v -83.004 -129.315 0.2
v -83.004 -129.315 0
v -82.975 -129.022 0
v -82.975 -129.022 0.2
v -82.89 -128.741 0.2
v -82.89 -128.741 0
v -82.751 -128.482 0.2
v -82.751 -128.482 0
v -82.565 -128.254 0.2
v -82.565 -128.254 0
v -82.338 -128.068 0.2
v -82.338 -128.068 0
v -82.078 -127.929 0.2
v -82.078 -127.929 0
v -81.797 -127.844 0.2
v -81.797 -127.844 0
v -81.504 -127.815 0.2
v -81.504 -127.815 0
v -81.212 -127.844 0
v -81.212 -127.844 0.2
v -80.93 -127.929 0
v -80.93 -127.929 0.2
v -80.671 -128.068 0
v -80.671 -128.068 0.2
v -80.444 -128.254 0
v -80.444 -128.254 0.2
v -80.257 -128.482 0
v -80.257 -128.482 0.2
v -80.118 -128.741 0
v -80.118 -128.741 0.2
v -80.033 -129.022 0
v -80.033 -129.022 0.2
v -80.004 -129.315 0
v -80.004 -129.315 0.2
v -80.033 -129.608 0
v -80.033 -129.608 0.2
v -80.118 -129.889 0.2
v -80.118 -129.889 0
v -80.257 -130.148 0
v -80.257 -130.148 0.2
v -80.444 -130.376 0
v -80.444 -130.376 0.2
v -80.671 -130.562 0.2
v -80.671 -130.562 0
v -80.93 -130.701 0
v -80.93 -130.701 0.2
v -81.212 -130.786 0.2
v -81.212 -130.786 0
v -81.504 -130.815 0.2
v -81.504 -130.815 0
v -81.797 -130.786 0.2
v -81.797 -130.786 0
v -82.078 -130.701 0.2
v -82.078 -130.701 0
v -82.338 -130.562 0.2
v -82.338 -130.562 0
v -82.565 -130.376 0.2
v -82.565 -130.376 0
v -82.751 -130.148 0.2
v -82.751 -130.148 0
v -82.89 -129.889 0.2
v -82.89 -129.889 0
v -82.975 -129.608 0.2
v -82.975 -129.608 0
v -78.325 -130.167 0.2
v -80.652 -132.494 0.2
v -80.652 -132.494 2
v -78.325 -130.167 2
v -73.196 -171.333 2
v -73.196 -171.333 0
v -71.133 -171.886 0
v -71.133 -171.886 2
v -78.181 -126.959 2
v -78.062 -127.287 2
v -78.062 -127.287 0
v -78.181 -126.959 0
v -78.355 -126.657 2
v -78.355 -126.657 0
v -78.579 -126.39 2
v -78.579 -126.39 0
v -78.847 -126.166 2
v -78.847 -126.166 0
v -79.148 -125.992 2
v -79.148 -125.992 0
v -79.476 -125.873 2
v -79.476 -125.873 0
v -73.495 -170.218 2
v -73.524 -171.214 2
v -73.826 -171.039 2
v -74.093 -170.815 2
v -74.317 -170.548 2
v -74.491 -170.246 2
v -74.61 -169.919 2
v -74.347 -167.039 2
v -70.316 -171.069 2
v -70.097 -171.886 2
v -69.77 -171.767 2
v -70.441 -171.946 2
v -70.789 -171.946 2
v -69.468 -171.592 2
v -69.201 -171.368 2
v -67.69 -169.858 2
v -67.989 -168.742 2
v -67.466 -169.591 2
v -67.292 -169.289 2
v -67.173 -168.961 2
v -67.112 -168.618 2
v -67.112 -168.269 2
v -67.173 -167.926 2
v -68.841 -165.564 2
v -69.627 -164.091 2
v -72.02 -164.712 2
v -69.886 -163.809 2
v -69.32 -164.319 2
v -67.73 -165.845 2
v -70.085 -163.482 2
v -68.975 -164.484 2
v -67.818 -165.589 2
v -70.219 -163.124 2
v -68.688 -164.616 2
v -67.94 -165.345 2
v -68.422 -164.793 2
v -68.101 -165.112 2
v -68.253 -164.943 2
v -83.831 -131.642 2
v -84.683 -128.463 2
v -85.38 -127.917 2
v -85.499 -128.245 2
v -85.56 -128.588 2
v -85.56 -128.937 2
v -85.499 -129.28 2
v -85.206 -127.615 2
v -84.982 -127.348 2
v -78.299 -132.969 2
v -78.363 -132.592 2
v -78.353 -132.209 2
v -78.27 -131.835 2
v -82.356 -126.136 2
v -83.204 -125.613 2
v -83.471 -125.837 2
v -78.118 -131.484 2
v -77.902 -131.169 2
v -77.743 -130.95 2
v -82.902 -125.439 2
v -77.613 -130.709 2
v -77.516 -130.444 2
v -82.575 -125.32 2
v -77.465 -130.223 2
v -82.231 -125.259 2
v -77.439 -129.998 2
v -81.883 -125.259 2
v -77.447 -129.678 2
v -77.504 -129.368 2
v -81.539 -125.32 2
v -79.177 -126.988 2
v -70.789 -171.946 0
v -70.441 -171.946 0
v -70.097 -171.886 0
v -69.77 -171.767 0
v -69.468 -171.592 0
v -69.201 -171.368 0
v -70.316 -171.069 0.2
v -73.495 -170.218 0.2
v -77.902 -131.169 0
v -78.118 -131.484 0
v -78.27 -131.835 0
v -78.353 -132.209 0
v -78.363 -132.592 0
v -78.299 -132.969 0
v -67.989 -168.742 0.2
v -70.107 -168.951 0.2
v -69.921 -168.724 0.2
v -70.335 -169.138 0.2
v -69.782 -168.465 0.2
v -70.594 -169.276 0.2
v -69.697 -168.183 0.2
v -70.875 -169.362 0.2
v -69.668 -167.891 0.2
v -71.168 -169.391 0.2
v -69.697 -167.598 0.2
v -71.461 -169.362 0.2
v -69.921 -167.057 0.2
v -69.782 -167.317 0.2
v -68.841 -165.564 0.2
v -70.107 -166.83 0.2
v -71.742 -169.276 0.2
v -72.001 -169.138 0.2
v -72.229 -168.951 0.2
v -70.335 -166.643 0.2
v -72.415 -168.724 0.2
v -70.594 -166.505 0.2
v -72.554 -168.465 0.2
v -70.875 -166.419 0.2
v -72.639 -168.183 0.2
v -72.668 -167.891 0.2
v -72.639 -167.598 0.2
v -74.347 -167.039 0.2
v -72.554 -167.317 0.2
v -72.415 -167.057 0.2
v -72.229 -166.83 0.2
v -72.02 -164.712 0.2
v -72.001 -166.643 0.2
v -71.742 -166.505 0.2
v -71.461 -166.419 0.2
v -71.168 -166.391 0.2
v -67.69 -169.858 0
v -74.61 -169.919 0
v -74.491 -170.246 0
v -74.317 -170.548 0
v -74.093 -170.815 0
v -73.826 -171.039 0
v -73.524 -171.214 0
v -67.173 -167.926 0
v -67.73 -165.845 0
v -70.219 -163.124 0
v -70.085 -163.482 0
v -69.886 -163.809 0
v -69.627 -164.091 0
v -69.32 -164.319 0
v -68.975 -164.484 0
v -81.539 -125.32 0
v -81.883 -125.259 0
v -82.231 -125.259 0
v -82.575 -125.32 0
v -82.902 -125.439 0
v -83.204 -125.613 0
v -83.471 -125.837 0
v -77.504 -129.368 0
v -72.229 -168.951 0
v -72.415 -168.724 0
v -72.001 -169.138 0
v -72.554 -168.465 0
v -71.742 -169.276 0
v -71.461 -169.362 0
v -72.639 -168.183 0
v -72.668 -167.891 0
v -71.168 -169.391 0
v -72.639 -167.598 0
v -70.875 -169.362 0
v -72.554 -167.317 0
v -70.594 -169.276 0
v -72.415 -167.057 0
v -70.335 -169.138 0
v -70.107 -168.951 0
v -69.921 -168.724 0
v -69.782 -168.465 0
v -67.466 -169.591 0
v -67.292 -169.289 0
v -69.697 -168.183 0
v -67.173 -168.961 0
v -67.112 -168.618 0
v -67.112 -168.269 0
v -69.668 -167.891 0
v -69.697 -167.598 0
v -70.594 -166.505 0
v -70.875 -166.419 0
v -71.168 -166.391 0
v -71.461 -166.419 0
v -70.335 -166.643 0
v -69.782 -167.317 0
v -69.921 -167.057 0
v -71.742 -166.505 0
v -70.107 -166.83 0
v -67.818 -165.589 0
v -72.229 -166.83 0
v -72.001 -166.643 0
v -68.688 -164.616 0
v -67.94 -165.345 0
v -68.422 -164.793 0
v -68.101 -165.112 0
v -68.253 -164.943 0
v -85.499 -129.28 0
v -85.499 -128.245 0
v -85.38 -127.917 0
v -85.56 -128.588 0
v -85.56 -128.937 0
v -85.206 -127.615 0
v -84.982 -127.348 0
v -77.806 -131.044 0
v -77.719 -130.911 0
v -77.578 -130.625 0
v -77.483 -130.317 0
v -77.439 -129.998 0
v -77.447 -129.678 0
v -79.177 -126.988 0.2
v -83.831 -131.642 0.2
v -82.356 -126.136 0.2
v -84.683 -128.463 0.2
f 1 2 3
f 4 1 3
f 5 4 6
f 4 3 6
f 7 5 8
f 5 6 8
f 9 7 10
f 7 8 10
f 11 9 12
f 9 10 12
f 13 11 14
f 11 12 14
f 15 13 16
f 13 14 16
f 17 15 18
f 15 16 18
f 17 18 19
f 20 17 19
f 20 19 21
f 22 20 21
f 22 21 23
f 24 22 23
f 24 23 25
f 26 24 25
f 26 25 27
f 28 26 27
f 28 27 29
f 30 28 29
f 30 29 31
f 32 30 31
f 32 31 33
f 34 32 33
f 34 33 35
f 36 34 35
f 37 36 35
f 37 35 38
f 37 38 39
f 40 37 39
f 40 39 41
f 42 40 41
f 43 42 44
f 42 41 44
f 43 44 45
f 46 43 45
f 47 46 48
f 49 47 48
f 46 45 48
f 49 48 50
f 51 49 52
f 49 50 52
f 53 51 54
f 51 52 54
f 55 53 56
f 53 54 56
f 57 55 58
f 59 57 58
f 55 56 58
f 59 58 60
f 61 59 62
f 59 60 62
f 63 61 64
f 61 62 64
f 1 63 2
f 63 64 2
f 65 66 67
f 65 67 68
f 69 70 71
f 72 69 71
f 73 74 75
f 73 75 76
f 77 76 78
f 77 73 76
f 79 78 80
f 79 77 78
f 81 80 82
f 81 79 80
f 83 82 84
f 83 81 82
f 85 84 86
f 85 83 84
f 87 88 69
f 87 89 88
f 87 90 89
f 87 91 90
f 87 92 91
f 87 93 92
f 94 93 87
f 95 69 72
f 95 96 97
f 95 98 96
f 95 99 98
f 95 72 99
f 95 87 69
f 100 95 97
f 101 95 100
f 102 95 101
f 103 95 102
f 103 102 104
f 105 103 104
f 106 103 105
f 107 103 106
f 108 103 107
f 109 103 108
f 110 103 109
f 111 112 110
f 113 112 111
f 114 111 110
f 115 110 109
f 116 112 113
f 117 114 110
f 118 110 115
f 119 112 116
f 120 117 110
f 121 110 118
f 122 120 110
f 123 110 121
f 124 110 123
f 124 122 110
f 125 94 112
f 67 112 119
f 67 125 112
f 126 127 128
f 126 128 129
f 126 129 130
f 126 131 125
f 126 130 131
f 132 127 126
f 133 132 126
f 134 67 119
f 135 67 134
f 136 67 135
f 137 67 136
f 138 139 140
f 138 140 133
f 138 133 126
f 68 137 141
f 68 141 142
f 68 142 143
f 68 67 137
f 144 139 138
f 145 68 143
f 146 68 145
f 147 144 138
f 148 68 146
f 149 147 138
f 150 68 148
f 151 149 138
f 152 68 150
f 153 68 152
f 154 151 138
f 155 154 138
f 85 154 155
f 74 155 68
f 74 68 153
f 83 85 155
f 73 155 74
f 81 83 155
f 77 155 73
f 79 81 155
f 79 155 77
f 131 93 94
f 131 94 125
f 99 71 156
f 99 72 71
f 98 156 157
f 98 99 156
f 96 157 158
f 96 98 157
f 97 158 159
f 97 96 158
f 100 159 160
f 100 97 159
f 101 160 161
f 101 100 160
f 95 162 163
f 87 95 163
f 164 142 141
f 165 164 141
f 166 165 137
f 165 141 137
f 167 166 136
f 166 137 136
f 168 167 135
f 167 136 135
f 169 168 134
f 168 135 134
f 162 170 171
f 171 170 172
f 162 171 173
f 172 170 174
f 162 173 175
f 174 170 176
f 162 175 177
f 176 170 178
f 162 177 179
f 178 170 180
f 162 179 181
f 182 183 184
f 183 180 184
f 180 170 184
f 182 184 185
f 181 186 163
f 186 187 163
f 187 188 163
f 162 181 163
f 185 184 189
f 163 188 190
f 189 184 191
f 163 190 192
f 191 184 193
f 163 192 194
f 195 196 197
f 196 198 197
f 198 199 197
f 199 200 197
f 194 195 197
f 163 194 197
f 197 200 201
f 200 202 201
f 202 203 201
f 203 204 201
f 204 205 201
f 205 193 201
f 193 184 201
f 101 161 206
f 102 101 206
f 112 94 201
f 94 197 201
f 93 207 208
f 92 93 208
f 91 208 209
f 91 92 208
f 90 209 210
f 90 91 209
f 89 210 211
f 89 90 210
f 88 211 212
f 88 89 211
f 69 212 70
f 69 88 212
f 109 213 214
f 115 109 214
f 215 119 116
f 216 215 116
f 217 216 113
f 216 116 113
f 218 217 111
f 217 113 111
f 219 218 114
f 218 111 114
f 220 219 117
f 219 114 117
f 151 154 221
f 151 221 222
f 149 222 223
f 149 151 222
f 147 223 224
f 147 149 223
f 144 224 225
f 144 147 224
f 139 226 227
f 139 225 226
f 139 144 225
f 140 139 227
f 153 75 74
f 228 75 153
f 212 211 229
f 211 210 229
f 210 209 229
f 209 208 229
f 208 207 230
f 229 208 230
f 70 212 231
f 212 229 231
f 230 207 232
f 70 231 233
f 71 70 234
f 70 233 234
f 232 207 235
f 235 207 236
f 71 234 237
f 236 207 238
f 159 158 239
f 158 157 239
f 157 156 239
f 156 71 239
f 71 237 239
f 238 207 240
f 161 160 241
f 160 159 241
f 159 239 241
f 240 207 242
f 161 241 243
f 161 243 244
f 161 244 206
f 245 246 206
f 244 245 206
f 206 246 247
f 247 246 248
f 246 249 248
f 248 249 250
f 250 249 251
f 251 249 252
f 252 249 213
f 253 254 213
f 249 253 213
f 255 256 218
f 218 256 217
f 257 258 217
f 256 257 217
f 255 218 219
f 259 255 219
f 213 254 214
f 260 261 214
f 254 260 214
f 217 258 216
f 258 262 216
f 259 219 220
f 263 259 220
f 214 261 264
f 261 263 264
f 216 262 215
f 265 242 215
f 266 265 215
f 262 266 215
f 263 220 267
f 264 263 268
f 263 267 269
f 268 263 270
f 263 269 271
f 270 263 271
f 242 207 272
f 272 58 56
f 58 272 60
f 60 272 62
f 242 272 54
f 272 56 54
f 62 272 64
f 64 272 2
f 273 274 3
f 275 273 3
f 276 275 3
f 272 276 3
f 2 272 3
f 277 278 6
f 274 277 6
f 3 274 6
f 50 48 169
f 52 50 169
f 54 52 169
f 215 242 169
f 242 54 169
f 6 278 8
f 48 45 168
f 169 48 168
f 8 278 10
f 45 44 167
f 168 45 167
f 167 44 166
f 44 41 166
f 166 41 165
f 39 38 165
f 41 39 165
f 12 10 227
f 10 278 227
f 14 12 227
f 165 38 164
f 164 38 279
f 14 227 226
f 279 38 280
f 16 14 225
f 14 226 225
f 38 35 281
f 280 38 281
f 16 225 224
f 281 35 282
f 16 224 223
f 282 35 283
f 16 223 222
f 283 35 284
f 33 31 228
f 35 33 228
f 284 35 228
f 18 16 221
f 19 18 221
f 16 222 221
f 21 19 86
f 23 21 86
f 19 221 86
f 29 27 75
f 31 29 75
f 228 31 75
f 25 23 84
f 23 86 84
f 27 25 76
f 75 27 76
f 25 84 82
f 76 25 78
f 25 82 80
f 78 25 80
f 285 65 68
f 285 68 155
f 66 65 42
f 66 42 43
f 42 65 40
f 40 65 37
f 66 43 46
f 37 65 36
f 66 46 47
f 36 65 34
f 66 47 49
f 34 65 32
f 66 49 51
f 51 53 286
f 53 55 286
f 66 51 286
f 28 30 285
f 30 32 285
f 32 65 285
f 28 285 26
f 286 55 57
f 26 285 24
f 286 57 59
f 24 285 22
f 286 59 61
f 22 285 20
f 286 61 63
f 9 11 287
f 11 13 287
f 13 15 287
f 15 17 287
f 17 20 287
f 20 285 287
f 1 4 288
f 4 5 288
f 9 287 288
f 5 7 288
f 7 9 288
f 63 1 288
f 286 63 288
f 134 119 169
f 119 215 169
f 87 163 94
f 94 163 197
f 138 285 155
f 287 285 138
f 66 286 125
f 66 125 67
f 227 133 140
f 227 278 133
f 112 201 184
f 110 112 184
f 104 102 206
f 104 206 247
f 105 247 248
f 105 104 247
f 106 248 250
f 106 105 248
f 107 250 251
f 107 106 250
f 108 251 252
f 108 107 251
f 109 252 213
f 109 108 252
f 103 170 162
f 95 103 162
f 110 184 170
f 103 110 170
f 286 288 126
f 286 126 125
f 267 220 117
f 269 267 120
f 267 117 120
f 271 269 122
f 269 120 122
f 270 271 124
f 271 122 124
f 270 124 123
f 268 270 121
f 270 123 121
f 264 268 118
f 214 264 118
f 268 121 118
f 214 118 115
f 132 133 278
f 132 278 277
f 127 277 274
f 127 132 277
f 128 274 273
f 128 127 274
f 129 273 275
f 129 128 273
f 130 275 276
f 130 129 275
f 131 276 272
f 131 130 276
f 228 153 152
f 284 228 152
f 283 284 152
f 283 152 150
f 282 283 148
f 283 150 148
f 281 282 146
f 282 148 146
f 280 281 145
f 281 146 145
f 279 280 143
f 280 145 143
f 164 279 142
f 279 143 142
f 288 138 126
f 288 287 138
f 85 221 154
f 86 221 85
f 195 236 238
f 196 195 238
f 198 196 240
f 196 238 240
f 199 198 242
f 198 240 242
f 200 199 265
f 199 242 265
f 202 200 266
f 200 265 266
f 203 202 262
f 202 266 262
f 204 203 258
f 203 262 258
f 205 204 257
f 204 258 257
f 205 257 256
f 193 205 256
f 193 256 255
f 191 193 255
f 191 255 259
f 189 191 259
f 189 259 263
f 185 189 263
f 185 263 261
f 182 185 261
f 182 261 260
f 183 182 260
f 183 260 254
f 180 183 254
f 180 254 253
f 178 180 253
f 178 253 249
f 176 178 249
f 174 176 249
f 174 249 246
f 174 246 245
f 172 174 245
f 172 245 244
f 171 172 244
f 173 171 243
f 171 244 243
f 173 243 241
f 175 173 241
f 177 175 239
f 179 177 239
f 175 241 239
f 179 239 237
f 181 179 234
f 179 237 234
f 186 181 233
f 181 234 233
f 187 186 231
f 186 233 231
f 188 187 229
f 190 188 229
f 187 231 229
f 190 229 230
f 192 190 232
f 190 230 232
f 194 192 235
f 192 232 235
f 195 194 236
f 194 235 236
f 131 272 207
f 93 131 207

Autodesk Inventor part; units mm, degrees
ref_plane "YZ Plane" through (0, 0, 0) normal (1, 0, 0) x (0, 1, 0)
ref_plane "XZ Plane" through (0, 0, 0) normal (0, 1, 0) x (-1, 0, 0)
ref_plane "XY Plane" through (0, 0, 0) normal (0, 0, 1) x (1, 0, 0)
sketch "Эскиз1" plane through (0, 0, 0) normal (0, 0, 1) x (1, 0, 0)
  line L0 (-88.2272, -119.1) -> (-57.3625, -234.2883) projected
  line L1 (-71.2043, -171.0391) -> (-83.11, -126.6066) construction
  line L2 (-69.083, -167.3649) -> (-79.4357, -128.7279)
  line L3 (-85.2313, -130.2808) -> (-74.8785, -168.9178)
  arc A0 (-74.8785, -168.9178) -> (-69.083, -167.3649) centre (-71.9807, -168.1414) ccw
  arc A1 (-79.4357, -128.7279) -> (-85.2313, -130.2808) centre (-82.3335, -129.5043) ccw
  line L4 (-68.8409, -165.5636) -> (-67.9892, -168.7423)
  line L5 (-67.9892, -168.7423) -> (-70.3162, -171.0693)
  line L6 (-70.3162, -171.0693) -> (-73.495, -170.2176)
  line L7 (-73.495, -170.2176) -> (-74.3467, -167.0388)
  line L8 (-74.3467, -167.0388) -> (-72.0197, -164.7118)
  line L9 (-72.0197, -164.7118) -> (-68.8409, -165.5636)
  line L10 (-72.3186, -163.5965) -> (-75.4621, -166.74)
  line L11 (-75.4621, -166.74) -> (-74.3115, -171.0341)
  line L12 (-74.3115, -171.0341) -> (-70.0173, -172.1847)
  line L13 (-70.0173, -172.1847) -> (-66.8738, -169.0412)
  line L14 (-66.8738, -169.0412) -> (-68.0244, -164.7471)
  line L15 (-68.0244, -164.7471) -> (-72.3186, -163.5965)
  line L16 (-77.1571, -148.8229) -> (-74.2593, -148.0464)
  line L17 (-78.3254, -130.1669) -> (-79.1772, -126.9881)
  line L18 (-79.1772, -126.9881) -> (-82.356, -126.1364)
  line L19 (-82.356, -126.1364) -> (-84.683, -128.4634)
  line L20 (-84.683, -128.4634) -> (-83.8312, -131.6422)
  line L21 (-80.6525, -132.4939) -> (-78.3254, -130.1669)
  line L22 (-80.3536, -133.6093) -> (-84.6477, -132.4587)
  line L23 (-85.7983, -128.1645) -> (-82.6548, -125.021)
  line L24 (-82.6548, -125.021) -> (-78.3607, -126.1716)
  line L25 (-78.3607, -126.1716) -> (-77.2101, -130.4657)
  line L26 (-77.2101, -130.4657) -> (-80.3536, -133.6093)
  line L27 (-83.8312, -131.6422) -> (-80.6525, -132.4939)
  point P0 (0, 0)
  point P1 (-71.168, -167.8906)
  point P2 (-69.9205, -164.239)
  point P3 (-78.5981, -131.8538)
  dimension "d0" = 0
  dimension "d2" = 40
  dimension "d3" = 3
  dimension "d4" = 5.7
  dimension "d5" = 1
  dimension "d6" = 1
extrude "Выдавливание1" add sketch "Эскиз1" along normal blind 2 contours L23 L24 L25 L26 L2 L21 L17 L18 L19 A1 L0 | A1 L19 L20 L27 L21 L2 L26 L22 L0 | L22 L26 L2 L15 L10 L0 | L10 L15 L2 L9 L8 L7 L6 A0 L0 | A0 L6 L5 L4 L9 L2 L15 L14 L13 L12 L0
sketch "Эскиз2" plane through (0, 0, 0) normal (0, 0, -1) x (-1, 0, 0)
  line L0 (78.3254, -130.1669) -> (80.6525, -132.4939) projected
  line L1 (84.683, -128.4634) -> (82.356, -126.1364) projected
  line L2 (83.8312, -131.6422) -> (84.683, -128.4634) projected
  line L3 (80.6525, -132.4939) -> (83.8312, -131.6422) projected
  line L4 (82.356, -126.1364) -> (79.1772, -126.9881) projected
  line L5 (79.1772, -126.9881) -> (78.3254, -130.1669) projected
  arc A0 (19.276, -252.9141) -> (17.0616, -251.2452) centre (19.4208, -250.4183) ccw projected
  arc A1 (19.276, -252.9141) -> (27.7531, -256.792) centre (35, -229.7461) ccw projected
  line L6 (48.5053, -262.3526) -> (27.7531, -256.792) projected
  line L7 (49.9977, -260.8602) -> (48.5053, -262.3526) projected
  arc A2 (51.783, -259.0748) -> (49.9977, -260.8602) centre (49.3645, -258.4417) ccw projected
  line L8 (60, -250.8579) -> (51.783, -259.0748) projected
  line L9 (60, -250.8579) -> (60, -245) projected
  line L10 (61.2941, -235.1704) -> (60, -245) projected
  line L11 (61.2941, -235.1704) -> (85, -146.6987) projected
  line L12 (85, -129.4867) -> (85, -146.6987) projected
  arc A3 (85, -111.5505) -> (85, -116.4495) centre (82.5, -114) ccw projected
  line L13 (85, -46.4495) -> (85, -111.5505) projected
  arc A4 (85, -41.5505) -> (85, -46.4495) centre (82.5, -44) ccw projected
  line L14 (85, -37.8284) -> (85, -41.5505) projected
  line L15 (76.4668, -29.2952) -> (85, -37.8284) projected
  arc A5 (72.9685, -21.4377) -> (76.4668, -29.2952) centre (84.9521, -20.8099) ccw projected
  arc A6 (72.9685, -21.4377) -> (27.398, -26.9013) centre (50, -22.641) ccw projected
  spline S0 degree 3 poles (27.6217, -27.9525) (27.5401, -27.6087) (27.4664, -27.263) (27.4007, -26.9157) (27.3998, -26.9109) (27.3989, -26.9061) (27.398, -26.9013) knots -4.945428 -4.945428 -4.945428 -4.945428 -4.899332 -4.899332 -4.899332 -4.898696 -4.898696 -4.898696 -4.898696 weights 1 1 1 1 1 1 1 projected
  spline S1 degree 3 poles (28.164, -30.4631) (27.9989, -29.614) (27.8171, -28.7759) (27.6217, -27.9525) knots 3.015096 3.015096 3.015096 3.015096 3.260421 3.260421 3.260421 3.260421 weights 1 1 1 1 projected
  spline S2 degree 3 poles (28.3854, -31.6677) (28.3156, -31.2645) (28.2417, -30.8629) (28.164, -30.4631) knots 1.901203 1.901203 1.901203 1.901203 2.021579 2.021579 2.021579 2.021579 projected
  spline S3 degree 3 poles (27.2821, -32.2702) (27.4905, -32.4048) (27.7033, -32.5146) (27.9524, -32.5655) (28.0203, -32.5713) (28.1301, -32.5543) (28.1726, -32.54) (28.2472, -32.4946) (28.2776, -32.4662) (28.335, -32.3905) (28.358, -32.3417) (28.403, -32.2042) (28.4139, -32.1072) (28.4174, -31.9004) (28.4051, -31.7812) (28.3854, -31.6677) knots 0 0 0 0 0.074448 0.074448 0.10037 0.10037 0.118258 0.118258 0.134856 0.134856 0.155747 0.155747 0.191916 0.191916 0.237121 0.237121 0.237121 0.237121 projected
  arc A7 (27.2821, -32.2702) -> (27.8696, -42.0032) centre (24, -37.3526) ccw projected
  spline S4 degree 3 poles (29.1017, -42.1691) (29.109, -42.0304) (29.1004, -41.9076) (29.061, -41.7446) (29.038, -41.6821) (28.9802, -41.5961) (28.9528, -41.5669) (28.8903, -41.5252) (28.8586, -41.5123) (28.7851, -41.4972) (28.7445, -41.4975) (28.6379, -41.5118) (28.5702, -41.5357) (28.3843, -41.6196) (28.2441, -41.7105) (28.0145, -41.8847) (27.9405, -41.9442) (27.8696, -42.0032) knots 0 0 0 0 0.041653 0.041653 0.066962 0.066962 0.083043 0.083043 0.096975 0.096975 0.113046 0.113046 0.139961 0.139961 0.194848 0.194848 0.220751 0.220751 0.220751 0.220751 projected
  spline S5 degree 3 poles (28.9908, -43.6688) (28.9918, -43.6586) (28.9927, -43.6484) (29.0398, -43.1514) (29.0756, -42.6615) (29.1017, -42.1691) knots 0.829158 0.829158 0.829158 0.829158 0.832223 0.832223 0.978679 0.978679 0.978679 0.978679 projected
  spline S6 degree 3 poles (19.7401, -60.1945) (21.5778, -59.1335) (23.1611, -57.7343) (25.061, -55.3244) (25.591, -54.5234) (27.536, -51.066) (28.3761, -48.1601) (28.7981, -45.2696) (28.876, -44.7357) (28.9396, -44.2038) (28.9908, -43.6688) knots 0 0 0 0 0.557778 0.557778 0.815105 0.815105 1.63021 1.63021 1.63021 1.780759 1.780759 1.780759 1.780759 weights 1 1 1 1 1 1 1 1 1 1 1 projected
  line L16 (19.7253, -60.203) -> (19.7401, -60.1945) projected
  line L17 (7, -67.55) -> (19.7253, -60.203) projected
  line L18 (7, -229.7461) -> (7, -67.55) projected
  arc A8 (7, -229.7461) -> (17.0616, -251.2452) centre (35, -229.7461) ccw projected
  circle A9 centre (27.4442, -220.4746) radius 2.5 projected
  circle A10 centre (38.4044, -239.4581) radius 7.5 projected
  circle A11 centre (24, -107.3526) radius 4 projected
  circle A12 centre (34.7265, -68.7944) radius 1.5 projected
  circle A13 centre (34.7265, -138.7944) radius 1.5 projected
  circle A14 centre (34.7265, -208.7944) radius 1.5 projected
  circle A15 centre (43.2836, -60.3339) radius 1.5 projected
  circle A16 centre (43.2836, -200.3339) radius 1.5 projected
  circle A17 centre (43.2836, -130.3339) radius 1.5 projected
  circle A18 centre (30.7187, -204.3292) radius 1.5 projected
  circle A19 centre (30.7187, -134.3292) radius 1.5 projected
  circle A20 centre (30.7187, -64.3292) radius 1.5 projected
  circle A21 centre (38.7342, -73.2595) radius 1.5 projected
  circle A22 centre (38.7342, -143.2595) radius 1.5 projected
  circle A23 centre (38.7342, -213.2595) radius 1.5 projected
  circle A24 centre (26.7109, -199.864) radius 1.5 projected
  circle A25 centre (26.7109, -129.864) radius 1.5 projected
  circle A26 centre (26.7109, -59.864) radius 1.5 projected
  circle A27 centre (50, -22.641) radius 6 projected
  circle A28 centre (24, -37.3526) radius 4 projected
  circle A29 centre (24, -177.3526) radius 4 projected
  circle A30 centre (57.3879, -228.498) radius 2.5 projected
  line L19 (74.3467, -167.0388) -> (72.0197, -164.7118) projected
  line L20 (73.495, -170.2176) -> (74.3467, -167.0388) projected
  line L21 (70.3162, -171.0693) -> (73.495, -170.2176) projected
  line L22 (67.9892, -168.7423) -> (70.3162, -171.0693) projected
  line L23 (68.8409, -165.5636) -> (67.9892, -168.7423) projected
  line L24 (72.0197, -164.7118) -> (68.8409, -165.5636) projected
  line L25 (80.6525, -132.4939) -> (83.8312, -131.6422) projected
  line L26 (79.1772, -126.9881) -> (78.3254, -130.1669) projected
  circle A31 centre (81.5042, -129.3151) radius 1.5
  circle A32 centre (71.168, -167.8906) radius 1.5
  arc A33 (85, -129.1436) -> (85, -129.4867) centre (81.5042, -129.3151) ccw projected
  line L27 (85, -116.4495) -> (85, -129.1436) projected
  circle A34 centre (71.168, -167.8906) radius 3.5 projected
  point P0 (0, 0)
  dimension "d9" = 3
  dimension "d10" = 3
extrude "Выдавливание2" add sketch "Эскиз2" against normal blind 0.2 contours L5 L4 L1 L2 L3 L0 | L20 L21 L22 L23 L24 L19
fillet "Сопряжение1" radius 2 10 edges at (-78.5981, -131.8538, 1) (-69.9205, -164.239, 1) (-68.0244, -164.7471, 1) (-66.8738, -169.0412, 1) (-70.0173, -172.1847, 1) (-74.3115, -171.0341, 1) (-82.6548, -125.021, 1) (-85.7983, -128.1645, 1) (-78.3607, -126.1716, 1) (-77.2101, -130.4657, 1)
properties part number "РельсКрышки"
